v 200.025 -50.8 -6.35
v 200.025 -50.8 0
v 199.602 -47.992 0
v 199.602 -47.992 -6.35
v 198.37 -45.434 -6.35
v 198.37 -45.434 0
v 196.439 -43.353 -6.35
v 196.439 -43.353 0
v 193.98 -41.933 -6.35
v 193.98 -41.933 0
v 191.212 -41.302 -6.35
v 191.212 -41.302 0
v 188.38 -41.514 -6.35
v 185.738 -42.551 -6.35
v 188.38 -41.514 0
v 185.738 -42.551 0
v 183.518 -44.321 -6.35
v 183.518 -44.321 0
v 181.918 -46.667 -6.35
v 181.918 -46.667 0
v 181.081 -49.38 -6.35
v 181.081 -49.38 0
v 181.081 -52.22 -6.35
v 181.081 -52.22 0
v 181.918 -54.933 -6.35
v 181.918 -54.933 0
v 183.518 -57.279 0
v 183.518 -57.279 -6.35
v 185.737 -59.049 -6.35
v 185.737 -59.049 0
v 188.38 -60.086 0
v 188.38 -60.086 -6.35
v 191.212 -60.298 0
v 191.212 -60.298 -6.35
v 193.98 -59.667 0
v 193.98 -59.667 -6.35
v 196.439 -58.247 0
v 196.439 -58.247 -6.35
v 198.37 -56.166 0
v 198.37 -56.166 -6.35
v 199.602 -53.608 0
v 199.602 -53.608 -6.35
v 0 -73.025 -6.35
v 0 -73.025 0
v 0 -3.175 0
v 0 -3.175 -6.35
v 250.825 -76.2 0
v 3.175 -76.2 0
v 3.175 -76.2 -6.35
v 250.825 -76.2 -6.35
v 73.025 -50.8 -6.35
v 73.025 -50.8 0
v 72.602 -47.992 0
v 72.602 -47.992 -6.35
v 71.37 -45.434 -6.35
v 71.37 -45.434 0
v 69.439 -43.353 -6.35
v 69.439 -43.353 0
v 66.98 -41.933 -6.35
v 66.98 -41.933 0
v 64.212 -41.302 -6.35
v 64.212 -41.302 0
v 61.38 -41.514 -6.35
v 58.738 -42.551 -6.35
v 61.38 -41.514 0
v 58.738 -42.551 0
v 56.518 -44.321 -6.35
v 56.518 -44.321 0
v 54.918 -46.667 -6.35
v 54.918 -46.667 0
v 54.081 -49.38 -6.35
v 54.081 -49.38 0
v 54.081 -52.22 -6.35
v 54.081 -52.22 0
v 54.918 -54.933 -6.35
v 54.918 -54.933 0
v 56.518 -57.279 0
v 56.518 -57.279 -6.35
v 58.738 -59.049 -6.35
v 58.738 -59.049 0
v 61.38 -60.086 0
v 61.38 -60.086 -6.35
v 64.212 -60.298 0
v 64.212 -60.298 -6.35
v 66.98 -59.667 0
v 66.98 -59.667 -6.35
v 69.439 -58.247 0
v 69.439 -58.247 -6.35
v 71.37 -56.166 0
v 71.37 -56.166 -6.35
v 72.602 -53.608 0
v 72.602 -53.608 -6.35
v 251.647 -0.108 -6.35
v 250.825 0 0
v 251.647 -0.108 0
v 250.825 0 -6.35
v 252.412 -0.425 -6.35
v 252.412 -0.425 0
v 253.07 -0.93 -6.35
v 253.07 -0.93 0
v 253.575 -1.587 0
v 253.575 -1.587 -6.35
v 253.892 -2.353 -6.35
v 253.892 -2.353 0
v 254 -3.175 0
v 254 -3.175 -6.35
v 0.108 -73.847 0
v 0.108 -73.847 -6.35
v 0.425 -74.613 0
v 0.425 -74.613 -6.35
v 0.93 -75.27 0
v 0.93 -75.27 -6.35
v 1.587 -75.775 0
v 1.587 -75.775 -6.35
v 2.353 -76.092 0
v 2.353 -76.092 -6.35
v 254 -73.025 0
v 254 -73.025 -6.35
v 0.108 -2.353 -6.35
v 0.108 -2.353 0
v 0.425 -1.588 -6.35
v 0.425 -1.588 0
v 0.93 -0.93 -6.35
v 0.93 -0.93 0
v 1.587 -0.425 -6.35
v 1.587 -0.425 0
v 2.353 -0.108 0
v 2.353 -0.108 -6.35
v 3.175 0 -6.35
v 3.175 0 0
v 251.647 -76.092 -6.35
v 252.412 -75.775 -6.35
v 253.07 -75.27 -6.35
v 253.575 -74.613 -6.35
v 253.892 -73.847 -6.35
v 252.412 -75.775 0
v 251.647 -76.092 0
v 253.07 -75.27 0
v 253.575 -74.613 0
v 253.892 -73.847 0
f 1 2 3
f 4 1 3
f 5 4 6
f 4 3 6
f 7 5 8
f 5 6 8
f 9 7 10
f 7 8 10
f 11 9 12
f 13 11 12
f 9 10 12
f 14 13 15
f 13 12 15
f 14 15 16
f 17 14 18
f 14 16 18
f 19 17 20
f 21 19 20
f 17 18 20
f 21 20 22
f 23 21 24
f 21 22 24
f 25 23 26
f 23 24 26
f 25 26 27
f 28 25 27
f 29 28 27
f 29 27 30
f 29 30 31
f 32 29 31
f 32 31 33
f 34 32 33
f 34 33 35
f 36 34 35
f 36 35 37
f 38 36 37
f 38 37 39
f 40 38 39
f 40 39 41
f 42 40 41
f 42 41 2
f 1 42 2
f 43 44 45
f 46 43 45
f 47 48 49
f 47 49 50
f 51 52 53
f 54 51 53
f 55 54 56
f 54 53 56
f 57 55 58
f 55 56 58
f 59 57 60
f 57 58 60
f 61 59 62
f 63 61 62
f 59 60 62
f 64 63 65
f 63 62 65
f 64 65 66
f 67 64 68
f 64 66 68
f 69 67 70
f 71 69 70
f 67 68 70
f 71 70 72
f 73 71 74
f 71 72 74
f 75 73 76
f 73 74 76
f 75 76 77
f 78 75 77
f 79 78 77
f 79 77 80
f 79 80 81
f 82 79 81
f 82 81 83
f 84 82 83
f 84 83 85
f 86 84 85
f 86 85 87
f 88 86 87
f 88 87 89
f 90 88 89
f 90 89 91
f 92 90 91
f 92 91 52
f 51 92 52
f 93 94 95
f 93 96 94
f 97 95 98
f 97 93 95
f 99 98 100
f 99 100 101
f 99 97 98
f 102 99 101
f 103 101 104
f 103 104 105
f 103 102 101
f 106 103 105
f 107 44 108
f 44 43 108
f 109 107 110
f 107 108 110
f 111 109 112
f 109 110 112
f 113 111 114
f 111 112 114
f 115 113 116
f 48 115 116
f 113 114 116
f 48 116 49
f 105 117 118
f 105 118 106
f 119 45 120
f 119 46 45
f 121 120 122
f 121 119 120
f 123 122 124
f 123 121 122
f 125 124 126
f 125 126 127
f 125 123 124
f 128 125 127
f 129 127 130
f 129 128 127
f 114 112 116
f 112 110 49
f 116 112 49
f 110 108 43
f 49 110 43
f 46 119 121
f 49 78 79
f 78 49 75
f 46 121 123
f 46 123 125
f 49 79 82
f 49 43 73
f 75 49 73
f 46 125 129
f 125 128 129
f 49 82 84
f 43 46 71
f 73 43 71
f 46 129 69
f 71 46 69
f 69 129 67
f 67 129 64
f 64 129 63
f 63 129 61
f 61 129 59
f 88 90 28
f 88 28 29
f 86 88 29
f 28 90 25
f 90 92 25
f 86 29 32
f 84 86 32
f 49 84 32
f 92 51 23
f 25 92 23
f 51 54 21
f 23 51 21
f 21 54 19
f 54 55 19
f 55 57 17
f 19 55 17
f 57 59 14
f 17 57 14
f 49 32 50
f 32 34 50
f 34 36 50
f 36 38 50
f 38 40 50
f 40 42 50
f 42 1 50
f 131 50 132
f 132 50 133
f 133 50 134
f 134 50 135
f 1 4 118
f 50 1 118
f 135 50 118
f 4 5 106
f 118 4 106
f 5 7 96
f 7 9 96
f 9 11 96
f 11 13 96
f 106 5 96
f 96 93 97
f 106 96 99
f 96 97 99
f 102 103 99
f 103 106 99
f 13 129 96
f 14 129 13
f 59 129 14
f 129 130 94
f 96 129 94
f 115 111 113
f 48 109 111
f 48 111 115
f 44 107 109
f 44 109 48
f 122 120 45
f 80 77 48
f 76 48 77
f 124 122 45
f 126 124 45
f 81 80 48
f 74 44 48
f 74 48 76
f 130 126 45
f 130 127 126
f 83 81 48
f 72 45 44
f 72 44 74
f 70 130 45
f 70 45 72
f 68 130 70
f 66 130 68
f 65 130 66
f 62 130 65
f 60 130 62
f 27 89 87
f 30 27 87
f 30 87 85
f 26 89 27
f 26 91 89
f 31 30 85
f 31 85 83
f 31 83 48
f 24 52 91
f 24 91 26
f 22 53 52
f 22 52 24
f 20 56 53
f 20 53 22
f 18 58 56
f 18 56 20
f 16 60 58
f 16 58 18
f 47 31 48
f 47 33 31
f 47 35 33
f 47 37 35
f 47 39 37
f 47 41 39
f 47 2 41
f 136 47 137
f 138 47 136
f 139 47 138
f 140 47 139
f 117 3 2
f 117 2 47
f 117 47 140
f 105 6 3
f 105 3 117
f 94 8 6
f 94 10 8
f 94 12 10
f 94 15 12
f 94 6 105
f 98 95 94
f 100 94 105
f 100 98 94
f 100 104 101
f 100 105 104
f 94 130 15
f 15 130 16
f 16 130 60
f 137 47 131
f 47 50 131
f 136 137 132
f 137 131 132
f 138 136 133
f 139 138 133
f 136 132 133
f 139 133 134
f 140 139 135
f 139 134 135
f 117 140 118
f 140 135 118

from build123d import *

# Parameters (mm, degrees)
F0_W     = 254
F0_H     = 76.2
F1_DEPTH = 6.35
F2_R     = 9.525
F3_DEPTH = 25.4
F4_R     = 3.175


with BuildPart() as f1:
    # F0 (on Top) → F1 (new body)
    with BuildSketch(Plane.XY):
        with Locations((127, -38.1)):
            Rectangle(F0_W, F0_H)
    extrude(amount=-F1_DEPTH)

    # F2 (on face) → F3 (cut)
    with BuildSketch(Plane.XY):
        with Locations((63.5, -50.8)):
            Circle(F2_R)
        with Locations((190.5, -50.8)):
            Circle(F2_R)
    extrude(amount=-F3_DEPTH, mode=Mode.SUBTRACT)

    # F4
    f4_edges = [f1.edges().sort_by_distance(p)[0] for p in [
        (254, -76.2, -3.175),
        (254, 0, -3.175),
        (0, -76.2, -3.175),
        (0, 0, -3.175),
    ]]
    fillet(f4_edges, radius=F4_R)


solid = f1.part
